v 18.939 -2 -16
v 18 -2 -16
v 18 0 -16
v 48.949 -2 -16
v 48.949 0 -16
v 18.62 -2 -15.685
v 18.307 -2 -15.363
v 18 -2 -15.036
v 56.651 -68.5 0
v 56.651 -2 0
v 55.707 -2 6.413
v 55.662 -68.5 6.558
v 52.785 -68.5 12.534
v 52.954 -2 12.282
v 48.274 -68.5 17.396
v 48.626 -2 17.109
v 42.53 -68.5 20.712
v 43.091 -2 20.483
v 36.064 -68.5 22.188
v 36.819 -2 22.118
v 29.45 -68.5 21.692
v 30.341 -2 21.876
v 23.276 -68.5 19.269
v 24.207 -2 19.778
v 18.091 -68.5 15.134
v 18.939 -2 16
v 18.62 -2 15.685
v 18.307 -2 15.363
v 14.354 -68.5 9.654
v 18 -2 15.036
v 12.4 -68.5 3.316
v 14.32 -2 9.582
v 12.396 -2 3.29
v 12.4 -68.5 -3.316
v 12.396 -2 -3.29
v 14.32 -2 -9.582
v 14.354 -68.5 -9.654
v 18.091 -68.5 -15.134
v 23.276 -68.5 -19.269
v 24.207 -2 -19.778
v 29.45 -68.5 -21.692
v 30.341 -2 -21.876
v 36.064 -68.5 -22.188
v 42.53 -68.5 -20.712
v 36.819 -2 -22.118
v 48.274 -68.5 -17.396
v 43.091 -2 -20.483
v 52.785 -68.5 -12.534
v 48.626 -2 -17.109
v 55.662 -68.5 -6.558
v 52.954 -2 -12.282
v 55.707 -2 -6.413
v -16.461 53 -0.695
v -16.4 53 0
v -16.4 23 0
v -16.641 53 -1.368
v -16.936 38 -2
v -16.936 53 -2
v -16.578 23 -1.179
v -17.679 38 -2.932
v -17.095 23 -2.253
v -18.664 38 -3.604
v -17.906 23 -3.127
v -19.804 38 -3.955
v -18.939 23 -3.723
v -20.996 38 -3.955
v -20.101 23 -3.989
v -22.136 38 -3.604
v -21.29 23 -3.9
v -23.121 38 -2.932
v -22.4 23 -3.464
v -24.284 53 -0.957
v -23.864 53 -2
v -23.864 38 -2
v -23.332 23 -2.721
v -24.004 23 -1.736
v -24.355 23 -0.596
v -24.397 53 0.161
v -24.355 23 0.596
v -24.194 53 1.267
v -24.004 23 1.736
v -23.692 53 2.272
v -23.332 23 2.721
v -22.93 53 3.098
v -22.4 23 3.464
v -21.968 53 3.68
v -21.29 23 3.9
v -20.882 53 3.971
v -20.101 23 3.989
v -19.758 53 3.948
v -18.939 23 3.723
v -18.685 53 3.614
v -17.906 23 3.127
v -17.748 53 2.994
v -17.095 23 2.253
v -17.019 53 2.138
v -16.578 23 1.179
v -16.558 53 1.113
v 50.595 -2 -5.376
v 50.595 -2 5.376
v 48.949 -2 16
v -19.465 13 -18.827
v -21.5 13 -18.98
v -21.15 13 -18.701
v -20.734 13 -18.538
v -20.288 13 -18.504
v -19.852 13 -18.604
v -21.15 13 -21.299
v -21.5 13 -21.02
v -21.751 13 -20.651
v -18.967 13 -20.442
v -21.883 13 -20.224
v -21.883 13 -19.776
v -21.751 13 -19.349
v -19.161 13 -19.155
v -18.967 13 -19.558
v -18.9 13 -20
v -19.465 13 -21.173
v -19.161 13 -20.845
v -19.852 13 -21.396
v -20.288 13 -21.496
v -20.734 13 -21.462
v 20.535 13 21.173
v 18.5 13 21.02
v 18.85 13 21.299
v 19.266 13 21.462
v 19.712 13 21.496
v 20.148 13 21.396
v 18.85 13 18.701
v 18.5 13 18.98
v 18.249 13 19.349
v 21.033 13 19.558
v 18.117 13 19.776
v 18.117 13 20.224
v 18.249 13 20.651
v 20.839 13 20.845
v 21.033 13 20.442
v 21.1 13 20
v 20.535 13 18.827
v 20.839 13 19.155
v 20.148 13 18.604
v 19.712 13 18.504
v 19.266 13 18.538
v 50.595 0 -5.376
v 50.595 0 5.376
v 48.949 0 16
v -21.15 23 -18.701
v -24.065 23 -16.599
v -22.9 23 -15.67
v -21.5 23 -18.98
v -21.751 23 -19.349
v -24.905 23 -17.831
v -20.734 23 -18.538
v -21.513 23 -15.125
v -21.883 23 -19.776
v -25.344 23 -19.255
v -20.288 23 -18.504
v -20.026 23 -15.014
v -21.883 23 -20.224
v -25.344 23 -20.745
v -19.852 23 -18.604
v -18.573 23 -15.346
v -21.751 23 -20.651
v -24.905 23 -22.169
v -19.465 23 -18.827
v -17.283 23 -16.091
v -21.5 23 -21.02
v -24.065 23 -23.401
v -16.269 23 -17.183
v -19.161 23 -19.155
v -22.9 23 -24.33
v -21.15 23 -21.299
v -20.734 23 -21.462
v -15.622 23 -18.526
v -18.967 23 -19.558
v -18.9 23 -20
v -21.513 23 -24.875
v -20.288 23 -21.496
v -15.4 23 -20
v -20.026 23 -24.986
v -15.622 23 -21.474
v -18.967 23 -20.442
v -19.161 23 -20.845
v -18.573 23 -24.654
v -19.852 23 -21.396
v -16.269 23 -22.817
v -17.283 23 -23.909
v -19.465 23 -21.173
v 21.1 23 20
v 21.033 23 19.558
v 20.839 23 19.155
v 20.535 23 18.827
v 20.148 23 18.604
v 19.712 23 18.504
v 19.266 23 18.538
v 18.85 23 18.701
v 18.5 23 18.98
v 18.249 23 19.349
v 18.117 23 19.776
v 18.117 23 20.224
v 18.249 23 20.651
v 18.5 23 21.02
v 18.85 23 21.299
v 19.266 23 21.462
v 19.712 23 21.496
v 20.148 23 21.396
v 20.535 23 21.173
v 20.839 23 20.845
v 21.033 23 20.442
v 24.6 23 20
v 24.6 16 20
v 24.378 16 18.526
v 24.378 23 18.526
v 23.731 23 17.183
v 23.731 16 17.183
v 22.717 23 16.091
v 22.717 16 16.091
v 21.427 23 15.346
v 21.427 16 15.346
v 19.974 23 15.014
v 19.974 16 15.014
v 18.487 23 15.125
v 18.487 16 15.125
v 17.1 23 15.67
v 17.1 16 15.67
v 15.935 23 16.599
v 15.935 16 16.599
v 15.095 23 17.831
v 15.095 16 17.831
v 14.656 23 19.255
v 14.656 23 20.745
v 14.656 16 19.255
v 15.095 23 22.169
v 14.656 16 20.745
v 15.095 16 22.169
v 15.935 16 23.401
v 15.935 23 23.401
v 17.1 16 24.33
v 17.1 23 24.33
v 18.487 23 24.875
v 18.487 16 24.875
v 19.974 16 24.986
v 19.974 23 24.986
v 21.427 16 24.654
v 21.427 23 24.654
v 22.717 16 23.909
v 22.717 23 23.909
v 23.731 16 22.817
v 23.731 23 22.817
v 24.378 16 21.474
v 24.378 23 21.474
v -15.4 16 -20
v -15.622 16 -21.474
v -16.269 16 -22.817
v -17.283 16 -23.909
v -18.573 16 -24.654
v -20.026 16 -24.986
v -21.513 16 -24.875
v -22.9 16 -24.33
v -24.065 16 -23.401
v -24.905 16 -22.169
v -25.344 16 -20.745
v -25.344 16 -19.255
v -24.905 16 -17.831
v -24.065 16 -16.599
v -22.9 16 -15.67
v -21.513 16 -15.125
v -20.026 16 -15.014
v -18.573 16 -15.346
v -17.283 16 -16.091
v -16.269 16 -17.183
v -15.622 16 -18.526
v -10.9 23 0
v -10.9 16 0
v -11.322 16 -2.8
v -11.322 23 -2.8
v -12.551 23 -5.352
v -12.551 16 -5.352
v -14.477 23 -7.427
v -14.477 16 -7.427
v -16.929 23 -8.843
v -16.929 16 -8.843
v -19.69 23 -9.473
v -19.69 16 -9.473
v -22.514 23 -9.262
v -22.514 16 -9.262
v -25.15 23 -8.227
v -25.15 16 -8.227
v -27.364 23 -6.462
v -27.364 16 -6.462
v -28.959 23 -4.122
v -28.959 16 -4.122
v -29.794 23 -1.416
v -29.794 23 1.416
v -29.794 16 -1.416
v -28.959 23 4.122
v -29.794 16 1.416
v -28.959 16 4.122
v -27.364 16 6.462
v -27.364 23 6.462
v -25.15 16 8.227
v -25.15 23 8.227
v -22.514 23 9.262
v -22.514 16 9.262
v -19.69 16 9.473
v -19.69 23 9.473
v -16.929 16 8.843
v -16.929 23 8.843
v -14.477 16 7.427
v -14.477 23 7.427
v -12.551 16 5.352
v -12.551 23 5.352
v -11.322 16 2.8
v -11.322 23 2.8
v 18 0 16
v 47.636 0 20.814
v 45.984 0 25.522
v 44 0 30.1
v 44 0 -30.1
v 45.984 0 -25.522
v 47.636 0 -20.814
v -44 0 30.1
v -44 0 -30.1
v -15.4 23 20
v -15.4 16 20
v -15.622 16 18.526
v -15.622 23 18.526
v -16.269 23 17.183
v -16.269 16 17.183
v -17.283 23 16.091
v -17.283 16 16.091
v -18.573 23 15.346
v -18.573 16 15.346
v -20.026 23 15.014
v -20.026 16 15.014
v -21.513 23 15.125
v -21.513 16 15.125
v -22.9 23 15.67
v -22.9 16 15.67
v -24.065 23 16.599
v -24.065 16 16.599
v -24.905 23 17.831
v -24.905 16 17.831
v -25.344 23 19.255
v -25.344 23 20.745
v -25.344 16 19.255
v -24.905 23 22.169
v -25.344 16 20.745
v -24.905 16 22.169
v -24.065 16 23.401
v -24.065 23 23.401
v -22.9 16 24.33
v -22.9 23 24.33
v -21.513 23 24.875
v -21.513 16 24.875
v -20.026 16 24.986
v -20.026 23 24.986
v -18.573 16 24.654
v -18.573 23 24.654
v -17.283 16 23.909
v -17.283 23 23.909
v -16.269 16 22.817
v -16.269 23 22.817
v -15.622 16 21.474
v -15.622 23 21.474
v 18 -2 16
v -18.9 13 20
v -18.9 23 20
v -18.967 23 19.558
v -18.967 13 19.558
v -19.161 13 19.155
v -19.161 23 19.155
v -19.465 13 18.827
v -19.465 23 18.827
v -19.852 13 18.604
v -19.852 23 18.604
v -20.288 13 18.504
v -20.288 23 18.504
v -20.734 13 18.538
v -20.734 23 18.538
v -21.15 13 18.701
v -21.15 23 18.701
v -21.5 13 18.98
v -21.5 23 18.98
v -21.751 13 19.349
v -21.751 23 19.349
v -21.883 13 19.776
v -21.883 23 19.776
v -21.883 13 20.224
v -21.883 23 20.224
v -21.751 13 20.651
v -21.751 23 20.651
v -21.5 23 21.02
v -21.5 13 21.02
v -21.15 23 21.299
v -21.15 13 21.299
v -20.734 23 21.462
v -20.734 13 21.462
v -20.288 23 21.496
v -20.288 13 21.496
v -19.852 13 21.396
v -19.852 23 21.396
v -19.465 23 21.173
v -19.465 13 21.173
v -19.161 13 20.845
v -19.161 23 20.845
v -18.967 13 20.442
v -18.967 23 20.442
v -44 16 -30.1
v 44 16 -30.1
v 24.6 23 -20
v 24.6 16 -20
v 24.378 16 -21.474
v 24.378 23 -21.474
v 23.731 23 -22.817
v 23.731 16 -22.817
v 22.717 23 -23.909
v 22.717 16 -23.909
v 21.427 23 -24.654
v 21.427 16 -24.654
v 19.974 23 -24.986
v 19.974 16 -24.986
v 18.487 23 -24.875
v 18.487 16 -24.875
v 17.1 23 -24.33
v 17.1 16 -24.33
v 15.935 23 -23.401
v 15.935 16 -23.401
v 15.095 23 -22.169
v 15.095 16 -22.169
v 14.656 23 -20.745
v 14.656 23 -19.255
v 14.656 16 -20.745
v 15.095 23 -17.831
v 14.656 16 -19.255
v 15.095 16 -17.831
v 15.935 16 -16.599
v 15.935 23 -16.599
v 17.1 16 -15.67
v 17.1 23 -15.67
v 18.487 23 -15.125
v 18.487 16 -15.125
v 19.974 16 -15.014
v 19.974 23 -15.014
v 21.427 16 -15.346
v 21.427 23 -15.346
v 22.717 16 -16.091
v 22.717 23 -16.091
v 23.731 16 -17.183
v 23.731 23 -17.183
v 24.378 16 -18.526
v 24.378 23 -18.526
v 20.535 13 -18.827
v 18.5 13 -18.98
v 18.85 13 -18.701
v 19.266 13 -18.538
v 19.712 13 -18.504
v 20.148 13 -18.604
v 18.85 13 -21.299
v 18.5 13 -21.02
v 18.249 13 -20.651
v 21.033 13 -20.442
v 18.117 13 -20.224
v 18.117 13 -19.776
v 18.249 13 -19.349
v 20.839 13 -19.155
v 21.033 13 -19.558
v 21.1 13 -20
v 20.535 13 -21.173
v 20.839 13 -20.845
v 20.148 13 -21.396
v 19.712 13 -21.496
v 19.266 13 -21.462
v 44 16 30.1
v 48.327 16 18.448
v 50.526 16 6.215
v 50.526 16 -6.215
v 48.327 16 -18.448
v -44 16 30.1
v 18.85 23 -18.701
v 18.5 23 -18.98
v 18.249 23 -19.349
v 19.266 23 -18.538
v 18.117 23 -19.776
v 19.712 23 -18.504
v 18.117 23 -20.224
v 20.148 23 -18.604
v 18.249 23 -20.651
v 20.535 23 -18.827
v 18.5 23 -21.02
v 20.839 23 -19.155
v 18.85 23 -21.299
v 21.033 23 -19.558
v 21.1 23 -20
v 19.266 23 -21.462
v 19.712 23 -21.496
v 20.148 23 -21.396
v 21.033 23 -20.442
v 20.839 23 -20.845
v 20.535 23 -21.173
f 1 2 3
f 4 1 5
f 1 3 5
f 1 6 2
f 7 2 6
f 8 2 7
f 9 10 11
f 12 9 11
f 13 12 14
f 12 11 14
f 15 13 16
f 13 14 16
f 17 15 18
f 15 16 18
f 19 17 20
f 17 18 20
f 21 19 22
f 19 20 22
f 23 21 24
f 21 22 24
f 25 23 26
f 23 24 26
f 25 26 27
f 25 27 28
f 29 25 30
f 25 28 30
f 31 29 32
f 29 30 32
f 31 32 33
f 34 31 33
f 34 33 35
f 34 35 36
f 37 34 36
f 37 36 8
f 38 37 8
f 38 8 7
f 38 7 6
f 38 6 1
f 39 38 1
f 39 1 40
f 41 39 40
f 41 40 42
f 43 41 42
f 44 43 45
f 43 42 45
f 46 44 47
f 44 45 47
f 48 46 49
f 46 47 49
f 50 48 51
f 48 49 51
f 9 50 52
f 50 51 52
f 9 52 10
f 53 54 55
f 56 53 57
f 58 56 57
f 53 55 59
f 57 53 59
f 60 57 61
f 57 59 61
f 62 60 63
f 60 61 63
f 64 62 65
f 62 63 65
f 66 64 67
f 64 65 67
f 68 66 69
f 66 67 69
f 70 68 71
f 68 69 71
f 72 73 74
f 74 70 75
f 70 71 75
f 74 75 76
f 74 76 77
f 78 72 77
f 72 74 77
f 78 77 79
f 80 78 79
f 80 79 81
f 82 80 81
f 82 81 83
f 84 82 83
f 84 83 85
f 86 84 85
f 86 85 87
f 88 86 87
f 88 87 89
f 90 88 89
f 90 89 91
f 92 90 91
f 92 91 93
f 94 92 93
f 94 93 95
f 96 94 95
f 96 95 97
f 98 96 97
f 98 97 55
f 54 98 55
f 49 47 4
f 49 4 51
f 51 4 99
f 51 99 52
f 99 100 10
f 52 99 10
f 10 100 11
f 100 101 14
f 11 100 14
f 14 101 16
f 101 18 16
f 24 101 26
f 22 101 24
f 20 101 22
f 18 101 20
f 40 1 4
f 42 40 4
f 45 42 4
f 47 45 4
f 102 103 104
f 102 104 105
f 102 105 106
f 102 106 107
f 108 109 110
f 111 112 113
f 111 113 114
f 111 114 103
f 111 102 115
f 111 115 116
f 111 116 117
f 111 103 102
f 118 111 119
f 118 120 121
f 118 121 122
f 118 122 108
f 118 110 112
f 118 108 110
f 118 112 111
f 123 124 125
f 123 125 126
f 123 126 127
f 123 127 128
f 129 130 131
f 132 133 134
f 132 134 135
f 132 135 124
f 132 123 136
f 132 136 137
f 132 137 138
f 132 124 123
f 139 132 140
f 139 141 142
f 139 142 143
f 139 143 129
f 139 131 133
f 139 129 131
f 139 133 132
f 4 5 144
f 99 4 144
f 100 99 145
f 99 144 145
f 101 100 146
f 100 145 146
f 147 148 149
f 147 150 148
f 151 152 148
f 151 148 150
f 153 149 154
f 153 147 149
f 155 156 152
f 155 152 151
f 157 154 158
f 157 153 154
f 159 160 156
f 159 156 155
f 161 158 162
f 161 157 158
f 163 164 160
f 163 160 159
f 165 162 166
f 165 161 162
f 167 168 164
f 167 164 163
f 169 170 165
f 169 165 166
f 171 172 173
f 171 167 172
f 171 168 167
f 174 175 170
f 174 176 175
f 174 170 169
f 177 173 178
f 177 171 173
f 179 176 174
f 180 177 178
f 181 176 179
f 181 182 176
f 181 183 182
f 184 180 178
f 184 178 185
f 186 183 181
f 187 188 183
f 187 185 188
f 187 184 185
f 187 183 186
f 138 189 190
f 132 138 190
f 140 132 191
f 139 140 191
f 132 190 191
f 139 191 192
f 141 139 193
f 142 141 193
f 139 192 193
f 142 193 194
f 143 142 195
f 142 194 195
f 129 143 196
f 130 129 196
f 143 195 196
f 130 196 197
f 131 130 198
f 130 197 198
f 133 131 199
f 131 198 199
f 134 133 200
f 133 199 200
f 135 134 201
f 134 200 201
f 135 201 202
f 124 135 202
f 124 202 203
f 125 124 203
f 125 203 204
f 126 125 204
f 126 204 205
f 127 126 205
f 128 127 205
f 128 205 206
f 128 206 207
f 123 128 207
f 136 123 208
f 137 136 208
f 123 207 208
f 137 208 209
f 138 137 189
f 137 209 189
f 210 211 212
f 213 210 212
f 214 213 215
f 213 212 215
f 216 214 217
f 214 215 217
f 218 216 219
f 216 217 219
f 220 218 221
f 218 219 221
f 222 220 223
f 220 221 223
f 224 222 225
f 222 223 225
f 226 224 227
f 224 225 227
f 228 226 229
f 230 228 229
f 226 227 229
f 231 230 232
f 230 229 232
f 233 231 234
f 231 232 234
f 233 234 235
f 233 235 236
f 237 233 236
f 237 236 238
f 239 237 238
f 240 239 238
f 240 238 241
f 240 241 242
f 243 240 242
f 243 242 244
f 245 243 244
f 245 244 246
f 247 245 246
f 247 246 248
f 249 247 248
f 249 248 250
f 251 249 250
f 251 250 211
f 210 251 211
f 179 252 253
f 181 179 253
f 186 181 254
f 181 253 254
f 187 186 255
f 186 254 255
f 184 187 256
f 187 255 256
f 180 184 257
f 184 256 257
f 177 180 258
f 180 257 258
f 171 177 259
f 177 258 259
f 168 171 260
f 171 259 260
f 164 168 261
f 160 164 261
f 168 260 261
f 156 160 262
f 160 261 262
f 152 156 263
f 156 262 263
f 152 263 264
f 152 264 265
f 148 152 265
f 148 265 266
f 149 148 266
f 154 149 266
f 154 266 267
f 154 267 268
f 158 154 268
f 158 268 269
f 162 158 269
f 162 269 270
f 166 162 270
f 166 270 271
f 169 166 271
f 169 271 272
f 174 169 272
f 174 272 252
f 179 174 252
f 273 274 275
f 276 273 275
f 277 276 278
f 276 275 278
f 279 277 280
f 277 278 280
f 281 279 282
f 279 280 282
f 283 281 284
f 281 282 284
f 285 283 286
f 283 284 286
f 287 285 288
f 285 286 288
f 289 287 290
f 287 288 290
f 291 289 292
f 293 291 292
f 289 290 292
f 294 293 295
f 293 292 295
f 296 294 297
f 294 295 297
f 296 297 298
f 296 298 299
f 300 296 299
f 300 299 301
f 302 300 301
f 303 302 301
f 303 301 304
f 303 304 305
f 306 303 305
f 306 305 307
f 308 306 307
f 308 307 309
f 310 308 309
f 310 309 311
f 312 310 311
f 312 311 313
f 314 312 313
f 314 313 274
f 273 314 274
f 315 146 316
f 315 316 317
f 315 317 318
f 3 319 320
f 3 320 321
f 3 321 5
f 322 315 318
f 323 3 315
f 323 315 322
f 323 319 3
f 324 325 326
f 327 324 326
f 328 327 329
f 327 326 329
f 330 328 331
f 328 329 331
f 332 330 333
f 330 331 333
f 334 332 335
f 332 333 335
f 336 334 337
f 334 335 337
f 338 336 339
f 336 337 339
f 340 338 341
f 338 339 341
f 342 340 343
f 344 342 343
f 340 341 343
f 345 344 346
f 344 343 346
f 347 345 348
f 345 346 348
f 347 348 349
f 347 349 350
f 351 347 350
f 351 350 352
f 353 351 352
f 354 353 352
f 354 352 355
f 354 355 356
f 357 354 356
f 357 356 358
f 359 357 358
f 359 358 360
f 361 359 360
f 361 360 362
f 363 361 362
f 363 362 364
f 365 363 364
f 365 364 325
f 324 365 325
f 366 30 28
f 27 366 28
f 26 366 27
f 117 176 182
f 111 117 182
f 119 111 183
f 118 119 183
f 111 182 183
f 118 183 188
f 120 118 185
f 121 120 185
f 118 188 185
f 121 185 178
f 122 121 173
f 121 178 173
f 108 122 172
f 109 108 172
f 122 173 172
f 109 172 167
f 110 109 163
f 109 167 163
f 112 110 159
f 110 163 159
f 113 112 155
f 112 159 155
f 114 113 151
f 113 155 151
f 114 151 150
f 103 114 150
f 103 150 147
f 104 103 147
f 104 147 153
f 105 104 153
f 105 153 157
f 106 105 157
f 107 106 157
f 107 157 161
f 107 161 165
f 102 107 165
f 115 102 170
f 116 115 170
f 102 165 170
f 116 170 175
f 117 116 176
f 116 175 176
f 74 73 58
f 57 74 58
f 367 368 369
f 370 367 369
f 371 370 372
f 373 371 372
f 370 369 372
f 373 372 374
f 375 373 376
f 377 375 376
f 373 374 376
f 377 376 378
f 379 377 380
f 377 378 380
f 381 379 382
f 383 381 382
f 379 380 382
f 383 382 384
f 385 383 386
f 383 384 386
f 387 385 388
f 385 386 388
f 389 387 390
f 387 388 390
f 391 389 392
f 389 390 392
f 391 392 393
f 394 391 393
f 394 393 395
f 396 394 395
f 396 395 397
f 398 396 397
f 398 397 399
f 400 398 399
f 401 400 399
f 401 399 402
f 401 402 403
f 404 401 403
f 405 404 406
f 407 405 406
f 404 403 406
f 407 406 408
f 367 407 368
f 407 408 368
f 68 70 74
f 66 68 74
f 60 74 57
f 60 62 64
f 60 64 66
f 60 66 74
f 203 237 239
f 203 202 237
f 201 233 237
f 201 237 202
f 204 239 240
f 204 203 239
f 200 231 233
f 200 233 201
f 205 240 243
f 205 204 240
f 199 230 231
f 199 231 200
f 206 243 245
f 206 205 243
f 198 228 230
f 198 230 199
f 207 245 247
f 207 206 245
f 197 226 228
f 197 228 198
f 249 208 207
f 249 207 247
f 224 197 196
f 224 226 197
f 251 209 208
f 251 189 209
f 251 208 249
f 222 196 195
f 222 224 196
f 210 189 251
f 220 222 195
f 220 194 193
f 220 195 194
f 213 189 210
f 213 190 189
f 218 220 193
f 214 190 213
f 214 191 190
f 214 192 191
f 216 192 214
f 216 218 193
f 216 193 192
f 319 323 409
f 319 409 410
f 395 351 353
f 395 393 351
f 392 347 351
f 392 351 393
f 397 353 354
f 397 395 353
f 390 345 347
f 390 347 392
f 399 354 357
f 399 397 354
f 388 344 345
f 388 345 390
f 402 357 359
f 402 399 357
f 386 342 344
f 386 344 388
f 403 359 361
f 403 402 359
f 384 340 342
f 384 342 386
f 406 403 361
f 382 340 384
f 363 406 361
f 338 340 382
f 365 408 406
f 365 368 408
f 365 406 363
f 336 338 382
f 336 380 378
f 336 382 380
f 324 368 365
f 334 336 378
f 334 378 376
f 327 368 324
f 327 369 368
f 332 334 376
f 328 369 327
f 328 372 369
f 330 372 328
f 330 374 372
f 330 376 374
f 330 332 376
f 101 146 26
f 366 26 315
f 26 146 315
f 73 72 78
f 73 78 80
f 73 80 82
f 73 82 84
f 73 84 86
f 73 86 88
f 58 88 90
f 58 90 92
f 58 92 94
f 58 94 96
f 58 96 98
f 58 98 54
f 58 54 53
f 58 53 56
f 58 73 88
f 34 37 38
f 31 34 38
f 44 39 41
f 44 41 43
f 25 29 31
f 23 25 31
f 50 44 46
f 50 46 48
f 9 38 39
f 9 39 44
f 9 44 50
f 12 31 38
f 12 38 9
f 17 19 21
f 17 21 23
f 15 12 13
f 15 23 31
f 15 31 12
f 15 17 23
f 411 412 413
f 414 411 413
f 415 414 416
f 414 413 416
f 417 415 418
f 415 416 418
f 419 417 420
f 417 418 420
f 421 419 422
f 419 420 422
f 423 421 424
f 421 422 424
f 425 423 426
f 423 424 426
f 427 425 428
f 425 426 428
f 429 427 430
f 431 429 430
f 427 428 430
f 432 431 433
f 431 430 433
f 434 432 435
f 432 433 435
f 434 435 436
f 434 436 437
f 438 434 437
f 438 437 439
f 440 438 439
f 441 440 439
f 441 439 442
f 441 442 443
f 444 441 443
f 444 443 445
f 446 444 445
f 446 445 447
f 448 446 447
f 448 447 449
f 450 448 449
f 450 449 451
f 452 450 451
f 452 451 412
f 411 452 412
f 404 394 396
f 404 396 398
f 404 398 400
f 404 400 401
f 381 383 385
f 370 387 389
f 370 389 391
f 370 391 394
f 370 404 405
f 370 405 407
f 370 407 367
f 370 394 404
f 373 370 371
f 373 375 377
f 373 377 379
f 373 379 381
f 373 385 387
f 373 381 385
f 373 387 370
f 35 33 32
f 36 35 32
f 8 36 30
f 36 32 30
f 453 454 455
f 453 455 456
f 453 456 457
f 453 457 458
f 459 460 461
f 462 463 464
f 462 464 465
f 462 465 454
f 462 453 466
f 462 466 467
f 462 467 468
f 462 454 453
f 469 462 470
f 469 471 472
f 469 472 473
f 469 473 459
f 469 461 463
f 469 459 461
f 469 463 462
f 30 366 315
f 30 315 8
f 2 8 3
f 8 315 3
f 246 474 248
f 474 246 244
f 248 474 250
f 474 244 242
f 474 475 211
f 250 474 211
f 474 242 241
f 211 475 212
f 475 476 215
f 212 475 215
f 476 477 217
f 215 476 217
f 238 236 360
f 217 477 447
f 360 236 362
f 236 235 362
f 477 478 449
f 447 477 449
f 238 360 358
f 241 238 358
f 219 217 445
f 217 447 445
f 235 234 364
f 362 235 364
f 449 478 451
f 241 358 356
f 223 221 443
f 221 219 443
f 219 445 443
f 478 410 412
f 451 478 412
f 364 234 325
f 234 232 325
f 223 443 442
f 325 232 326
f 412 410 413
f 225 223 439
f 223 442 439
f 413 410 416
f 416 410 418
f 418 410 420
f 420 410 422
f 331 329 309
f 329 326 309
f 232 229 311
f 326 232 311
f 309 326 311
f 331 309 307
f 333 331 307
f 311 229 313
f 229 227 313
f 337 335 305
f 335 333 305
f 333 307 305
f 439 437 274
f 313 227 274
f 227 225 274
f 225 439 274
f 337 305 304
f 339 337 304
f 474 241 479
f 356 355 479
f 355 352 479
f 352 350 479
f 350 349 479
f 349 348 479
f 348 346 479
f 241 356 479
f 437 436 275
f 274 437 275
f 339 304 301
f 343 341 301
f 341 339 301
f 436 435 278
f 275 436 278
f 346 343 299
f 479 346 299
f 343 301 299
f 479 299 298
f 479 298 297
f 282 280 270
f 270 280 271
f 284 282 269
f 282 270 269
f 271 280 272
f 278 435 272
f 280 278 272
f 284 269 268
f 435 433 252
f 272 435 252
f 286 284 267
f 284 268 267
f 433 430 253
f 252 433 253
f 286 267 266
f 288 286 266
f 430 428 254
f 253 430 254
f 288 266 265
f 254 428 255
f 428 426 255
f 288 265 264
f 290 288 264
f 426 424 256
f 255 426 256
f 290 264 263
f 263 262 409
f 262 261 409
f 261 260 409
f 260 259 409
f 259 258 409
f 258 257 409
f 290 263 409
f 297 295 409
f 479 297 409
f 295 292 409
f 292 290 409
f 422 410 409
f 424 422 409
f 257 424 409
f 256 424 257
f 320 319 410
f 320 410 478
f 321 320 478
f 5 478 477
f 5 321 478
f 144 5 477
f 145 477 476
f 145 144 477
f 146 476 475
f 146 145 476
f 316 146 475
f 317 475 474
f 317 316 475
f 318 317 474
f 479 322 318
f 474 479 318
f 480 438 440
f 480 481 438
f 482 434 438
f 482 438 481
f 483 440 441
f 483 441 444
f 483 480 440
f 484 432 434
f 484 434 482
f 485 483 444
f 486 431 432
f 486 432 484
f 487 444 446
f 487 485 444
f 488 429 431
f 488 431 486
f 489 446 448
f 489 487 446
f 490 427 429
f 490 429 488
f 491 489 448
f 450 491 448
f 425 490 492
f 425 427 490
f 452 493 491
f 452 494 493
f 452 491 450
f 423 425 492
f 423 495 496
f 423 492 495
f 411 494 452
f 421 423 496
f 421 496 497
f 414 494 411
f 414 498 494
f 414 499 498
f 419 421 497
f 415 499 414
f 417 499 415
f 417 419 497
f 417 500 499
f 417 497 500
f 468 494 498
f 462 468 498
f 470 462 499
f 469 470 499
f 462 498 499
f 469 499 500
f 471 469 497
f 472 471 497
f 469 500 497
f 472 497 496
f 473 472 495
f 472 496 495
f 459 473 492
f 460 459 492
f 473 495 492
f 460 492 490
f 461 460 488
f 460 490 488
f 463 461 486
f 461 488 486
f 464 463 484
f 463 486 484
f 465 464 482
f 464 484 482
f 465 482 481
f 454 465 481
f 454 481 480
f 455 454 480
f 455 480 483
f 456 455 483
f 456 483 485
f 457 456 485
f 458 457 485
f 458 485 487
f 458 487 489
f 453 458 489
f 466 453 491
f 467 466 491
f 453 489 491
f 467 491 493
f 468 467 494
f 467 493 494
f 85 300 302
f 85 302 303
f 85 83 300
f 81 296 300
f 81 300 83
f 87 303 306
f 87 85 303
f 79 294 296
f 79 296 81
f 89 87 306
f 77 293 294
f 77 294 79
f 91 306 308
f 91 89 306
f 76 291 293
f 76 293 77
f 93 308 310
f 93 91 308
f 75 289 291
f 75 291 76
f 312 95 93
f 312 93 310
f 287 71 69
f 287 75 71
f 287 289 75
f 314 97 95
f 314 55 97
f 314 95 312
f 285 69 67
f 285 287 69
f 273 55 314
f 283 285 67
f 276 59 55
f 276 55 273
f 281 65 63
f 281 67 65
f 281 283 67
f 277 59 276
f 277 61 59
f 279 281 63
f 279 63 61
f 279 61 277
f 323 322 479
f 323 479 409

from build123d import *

# Parameters (mm, degrees)
SKETCH_1_W          = 88
SKETCH_1_H          = 60.2
EXTRUDE_1_DEPTH     = 16
SKETCH_1_4_R        = 5
SKETCH_1_4_R_2      = 9.5
EXTRUDE_3_DEPTH     = 23
SKETCH_2_R          = 4
EXTRUDE_4_DEPTH     = 30
CUT_EXTRUDE_3_DEPTH = 15
SKETCH_4_R          = 1.5
CUT_EXTRUDE_4_DEPTH = 10
EXTRUDE_6_DEPTH     = 16
EXTRUDE_7_DEPTH     = 2
SKETCH_7_R          = 22.25
EXTRUDE_8_DEPTH     = 66.5


with BuildPart() as part:
    # 草图1 → 凸台-拉伸1 (new body)
    with BuildSketch(Plane(origin=(0, 0, 0), x_dir=(1, 0, 0), z_dir=(0, 1, 0))):
        Rectangle(SKETCH_1_W, SKETCH_1_H)
    extrude(amount=EXTRUDE_1_DEPTH)

    # 草图1<4> → 凸台-拉伸3 (add)
    with BuildSketch(Plane(origin=(0, 0, 0), x_dir=(1, 0, 0), z_dir=(0, 1, 0))):
        with Locations((-20.4, 20)):
            Circle(SKETCH_1_4_R)
        with Locations((19.6, 20)):
            Circle(SKETCH_1_4_R)
        with Locations((19.6, -20)):
            Circle(SKETCH_1_4_R)
        with Locations((-20.4, -20)):
            Circle(SKETCH_1_4_R)
        with Locations((-20.4, 0)):
            Circle(SKETCH_1_4_R_2)
    extrude(amount=EXTRUDE_3_DEPTH)

    # 草图2 → 凸台-拉伸4 (add)
    with BuildSketch(Plane(origin=(0, 23, 0), x_dir=(1, 0, 0), z_dir=(0, 1, 0))):
        with Locations((-20.4, 0)):
            Circle(SKETCH_2_R)
    extrude(amount=EXTRUDE_4_DEPTH)

    # 草图3 → 切除-拉伸3 (cut)
    with BuildSketch(Plane(origin=(0, 53, 0), x_dir=(1, 0, 0), z_dir=(0, 1, 0))):
        with BuildLine():
            Line((-23.864101615, 2), (-16.935898385, 2))
            ThreePointArc((-16.935898385, 2), (-20.4, 4), (-23.864101615, 2))
        make_face()
    extrude(amount=-CUT_EXTRUDE_3_DEPTH, mode=Mode.SUBTRACT)

    # 草图4 → 切除-拉伸4 (cut)
    with BuildSketch(Plane(origin=(0, 23, 0), x_dir=(1, 0, 0), z_dir=(0, 1, 0))):
        with Locations((-20.4, 20)):
            Circle(SKETCH_4_R)
        with Locations((19.6, 20)):
            Circle(SKETCH_4_R)
        with Locations((19.6, -20)):
            Circle(SKETCH_4_R)
        with Locations((-20.4, -20)):
            Circle(SKETCH_4_R)
    extrude(amount=-CUT_EXTRUDE_4_DEPTH, mode=Mode.SUBTRACT)

    # 草图5 → 凸台-拉伸6 (add)
    with BuildSketch(Plane(origin=(0, 0, 0), x_dir=(1, 0, 0), z_dir=(0, 1, 0))):
        with BuildLine():
            Line((44, -30.1), (44, 30.1))
            ThreePointArc((44, 30.1), (50.801977879, 0), (44, -30.1))
        make_face()
    extrude(amount=EXTRUDE_6_DEPTH)

    # 草图6 → 凸台-拉伸7 (add)
    with BuildSketch(Plane.XZ):
        with BuildLine():
            Line((18, -16), (48.948878029, -16))
            ThreePointArc((48.948878029, -16), (50.801977879, 0), (48.948878029, 16))
            Line((48.948878029, 16), (18, 16))
            Line((18, 16), (18, -16))
        make_face()
    extrude(amount=EXTRUDE_7_DEPTH)

    # 草图7 → 凸台-拉伸8 (add)
    with BuildSketch(Plane.XZ.offset(2)):
        with Locations((34.40098894, 0)):
            Circle(SKETCH_7_R)
    extrude(amount=EXTRUDE_8_DEPTH)


solid = part.part
